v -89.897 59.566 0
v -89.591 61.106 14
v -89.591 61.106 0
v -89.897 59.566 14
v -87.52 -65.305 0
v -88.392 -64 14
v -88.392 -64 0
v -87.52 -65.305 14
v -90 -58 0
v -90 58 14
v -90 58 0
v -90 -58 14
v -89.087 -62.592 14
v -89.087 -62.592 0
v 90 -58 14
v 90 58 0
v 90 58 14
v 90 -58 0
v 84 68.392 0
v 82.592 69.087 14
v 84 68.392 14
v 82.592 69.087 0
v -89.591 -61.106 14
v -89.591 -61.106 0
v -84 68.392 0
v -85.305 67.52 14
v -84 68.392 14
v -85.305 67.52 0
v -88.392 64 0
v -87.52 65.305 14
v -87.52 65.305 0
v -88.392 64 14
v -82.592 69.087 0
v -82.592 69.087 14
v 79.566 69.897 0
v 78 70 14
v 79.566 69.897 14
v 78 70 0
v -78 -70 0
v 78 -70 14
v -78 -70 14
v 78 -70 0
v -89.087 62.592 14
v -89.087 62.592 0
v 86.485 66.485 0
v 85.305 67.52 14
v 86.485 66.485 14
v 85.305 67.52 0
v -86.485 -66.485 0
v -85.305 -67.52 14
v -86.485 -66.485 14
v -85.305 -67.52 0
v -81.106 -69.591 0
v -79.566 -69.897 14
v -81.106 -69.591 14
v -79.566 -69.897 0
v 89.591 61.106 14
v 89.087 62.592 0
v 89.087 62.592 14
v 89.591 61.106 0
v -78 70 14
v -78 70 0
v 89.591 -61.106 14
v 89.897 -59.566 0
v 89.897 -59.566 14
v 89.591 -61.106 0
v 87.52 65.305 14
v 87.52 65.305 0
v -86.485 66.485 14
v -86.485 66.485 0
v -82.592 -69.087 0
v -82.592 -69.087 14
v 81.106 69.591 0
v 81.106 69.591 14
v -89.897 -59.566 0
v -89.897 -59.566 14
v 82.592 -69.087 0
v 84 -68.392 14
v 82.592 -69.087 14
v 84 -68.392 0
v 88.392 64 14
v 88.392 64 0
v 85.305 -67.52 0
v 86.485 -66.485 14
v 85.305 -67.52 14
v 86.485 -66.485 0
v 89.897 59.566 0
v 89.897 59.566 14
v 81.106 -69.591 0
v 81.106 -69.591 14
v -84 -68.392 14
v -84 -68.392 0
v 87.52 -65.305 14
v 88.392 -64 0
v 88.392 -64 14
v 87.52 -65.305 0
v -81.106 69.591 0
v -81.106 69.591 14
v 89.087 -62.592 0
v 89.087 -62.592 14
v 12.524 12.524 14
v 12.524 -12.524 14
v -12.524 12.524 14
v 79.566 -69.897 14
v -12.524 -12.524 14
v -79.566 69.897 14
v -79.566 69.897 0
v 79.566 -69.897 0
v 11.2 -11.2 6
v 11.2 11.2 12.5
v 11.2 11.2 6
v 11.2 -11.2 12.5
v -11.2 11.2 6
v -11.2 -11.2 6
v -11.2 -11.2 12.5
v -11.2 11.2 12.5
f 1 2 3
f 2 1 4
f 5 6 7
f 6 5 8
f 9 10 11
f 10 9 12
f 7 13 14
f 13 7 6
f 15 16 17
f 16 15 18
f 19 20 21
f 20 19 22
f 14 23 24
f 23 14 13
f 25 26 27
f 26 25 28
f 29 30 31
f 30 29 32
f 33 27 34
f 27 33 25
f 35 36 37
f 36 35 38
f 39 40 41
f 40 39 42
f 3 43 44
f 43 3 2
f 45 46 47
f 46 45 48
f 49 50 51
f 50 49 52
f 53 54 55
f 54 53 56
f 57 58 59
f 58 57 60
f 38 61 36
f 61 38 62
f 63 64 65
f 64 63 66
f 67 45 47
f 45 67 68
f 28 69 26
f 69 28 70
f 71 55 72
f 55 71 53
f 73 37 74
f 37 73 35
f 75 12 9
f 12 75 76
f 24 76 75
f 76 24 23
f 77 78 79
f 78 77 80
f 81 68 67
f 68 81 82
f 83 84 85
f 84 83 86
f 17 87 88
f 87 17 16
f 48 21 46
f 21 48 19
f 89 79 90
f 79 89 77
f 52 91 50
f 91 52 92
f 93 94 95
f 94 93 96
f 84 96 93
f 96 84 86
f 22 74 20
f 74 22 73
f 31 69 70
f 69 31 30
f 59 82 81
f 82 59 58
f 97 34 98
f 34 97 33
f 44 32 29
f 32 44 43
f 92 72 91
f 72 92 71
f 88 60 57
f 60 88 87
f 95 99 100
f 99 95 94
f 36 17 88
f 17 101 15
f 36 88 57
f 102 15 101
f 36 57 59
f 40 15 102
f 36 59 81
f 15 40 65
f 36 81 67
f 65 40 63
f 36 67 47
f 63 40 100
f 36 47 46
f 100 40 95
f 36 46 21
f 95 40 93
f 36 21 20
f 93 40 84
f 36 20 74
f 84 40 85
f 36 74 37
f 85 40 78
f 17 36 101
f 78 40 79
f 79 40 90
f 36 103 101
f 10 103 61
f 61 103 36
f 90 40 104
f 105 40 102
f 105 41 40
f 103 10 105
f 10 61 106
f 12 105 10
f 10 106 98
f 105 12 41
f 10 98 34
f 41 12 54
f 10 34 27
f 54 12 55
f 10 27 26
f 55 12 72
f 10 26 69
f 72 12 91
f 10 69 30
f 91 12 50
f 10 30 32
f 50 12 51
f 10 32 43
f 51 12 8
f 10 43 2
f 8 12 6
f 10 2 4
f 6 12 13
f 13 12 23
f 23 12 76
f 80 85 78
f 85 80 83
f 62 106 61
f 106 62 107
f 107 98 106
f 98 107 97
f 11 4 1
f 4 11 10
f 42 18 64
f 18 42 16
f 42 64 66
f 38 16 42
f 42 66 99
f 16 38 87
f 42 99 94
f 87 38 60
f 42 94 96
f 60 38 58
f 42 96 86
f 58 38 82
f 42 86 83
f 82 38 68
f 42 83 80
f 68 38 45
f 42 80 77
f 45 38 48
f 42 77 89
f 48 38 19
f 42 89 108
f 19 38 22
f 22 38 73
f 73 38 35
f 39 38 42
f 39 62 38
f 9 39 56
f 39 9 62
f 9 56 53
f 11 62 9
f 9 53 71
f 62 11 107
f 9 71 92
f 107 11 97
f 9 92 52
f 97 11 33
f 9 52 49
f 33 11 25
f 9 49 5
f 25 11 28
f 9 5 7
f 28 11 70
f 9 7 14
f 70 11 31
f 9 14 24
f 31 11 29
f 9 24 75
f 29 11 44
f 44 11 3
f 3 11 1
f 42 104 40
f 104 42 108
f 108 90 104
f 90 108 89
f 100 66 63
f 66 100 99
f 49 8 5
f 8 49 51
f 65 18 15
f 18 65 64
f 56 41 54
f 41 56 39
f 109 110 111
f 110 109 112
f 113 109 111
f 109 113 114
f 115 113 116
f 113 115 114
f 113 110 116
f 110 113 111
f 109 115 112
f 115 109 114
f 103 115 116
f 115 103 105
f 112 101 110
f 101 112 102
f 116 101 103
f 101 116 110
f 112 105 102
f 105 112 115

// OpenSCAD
/* Headphone stand in three parts: base, post, hanger.
   Each part is exported in its print orientation (rests on min z, +Z up).
   Joints: square slip fit 22/22.4 (base-post) and 18/18.4 (post-hanger),
   0.2 mm/side nominal clearance. */

part = "base"; // [base,post,hanger,assembly]

cadverify_only = "";
module instance(name, part, unit = 1) {
    echo(cadverify_instance = [name, part, unit]);
    if (cadverify_only == "" || cadverify_only == name) children();
}

// ---------- parameters (mm) ----------
base_L = 180; base_W = 140; base_H = 14; base_corner_r = 12;
base_sock_S = 22.4; base_sock_straight_top = 12.5; base_sock_floor = 6;
base_flare_top_S = 25.4;

post_bot_tenon_S = 22; post_bot_tenon_H = 8;
post_cone_H = 4; post_body_bot_S = 30; post_body_top_S = 24; post_body_H = 224;
post_top_tenon_S = 18; post_top_tenon_H = 8;

hanger_L = 110; hanger_W = 44; hanger_slab_H = 6; hanger_ridge_R = 22;
hanger_ridge_L = 90; hanger_sock_S = 18.4; hanger_sock_H = 8.1;
hanger_roof_base = 7.9; hanger_roof_H = 9.2;

post_Z = 6;
hanger_Z = 242; // post shoulder (236+6) -> hanger top 242+28 = 270

// ---------- modules (print orientation, min z = 0) ----------
module base() {
    difference() {
        linear_extrude(height = base_H)
            hull() {
                for (sx = [-1, 1], sy = [-1, 1])
                    translate([sx*(base_L/2-base_corner_r), sy*(base_W/2-base_corner_r)])
                        circle(r = base_corner_r, $fn = 48);
            }
        // straight socket
        translate([-base_sock_S/2, -base_sock_S/2, base_sock_floor])
            cube([base_sock_S, base_sock_S, base_H - base_sock_floor + 0.2]);
        // 45 deg entry flare
        translate([0, 0, base_sock_straight_top])
            linear_extrude(height = base_H - base_sock_straight_top + 0.2,
                           scale = base_flare_top_S/base_sock_S)
                square([base_sock_S, base_sock_S], center = true);
    }
}

module post() {
    // bottom tenon
    translate([-post_bot_tenon_S/2, -post_bot_tenon_S/2, 0])
        cube([post_bot_tenon_S, post_bot_tenon_S, post_bot_tenon_H]);
    // 45 deg collar cone 22 -> 30
    translate([0, 0, post_bot_tenon_H])
        linear_extrude(height = post_cone_H, scale = post_body_bot_S/post_bot_tenon_S)
            square([post_bot_tenon_S, post_bot_tenon_S], center = true);
    // tapered body 30 -> 24
    translate([0, 0, post_bot_tenon_H + post_cone_H])
        linear_extrude(height = post_body_H, scale = post_body_top_S/post_body_bot_S)
            square([post_body_bot_S, post_body_bot_S], center = true);
    // top tenon
    translate([-post_top_tenon_S/2, -post_top_tenon_S/2,
               post_bot_tenon_H + post_cone_H + post_body_H])
        cube([post_top_tenon_S, post_top_tenon_S, post_top_tenon_H]);
}

module hanger() {
    difference() {
        union() {
            // bottom slab with rounded plan corners
            linear_extrude(height = hanger_slab_H)
                hull() {
                    for (sx = [-1, 1], sy = [-1, 1])
                        translate([sx*(hanger_L/2-6), sy*(hanger_W/2-6)])
                            circle(r = 6, $fn = 32);
                }
            // rounded crown: top half of a horizontal cylinder along X
            intersection() {
                translate([0, 0, hanger_slab_H])
                    rotate([0, 90, 0])
                        cylinder(r = hanger_ridge_R, h = hanger_ridge_L,
                                 center = true, $fn = 128);
                translate([-hanger_ridge_L/2, -hanger_W/2, hanger_slab_H - 0.1])
                    cube([hanger_ridge_L, hanger_W, hanger_ridge_R + 0.1]);
            }
        }
        // straight socket from the bed face, top meets roof base exactly
        translate([-hanger_sock_S/2, -hanger_sock_S/2, -0.1])
            cube([hanger_sock_S, hanger_sock_S, hanger_roof_base + 0.1]);
        // 45 deg pyramid roof inside (no flat ceiling -> no supports)
        translate([0, 0, hanger_roof_base])
            linear_extrude(height = hanger_roof_H, scale = 0)
                square([hanger_sock_S, hanger_sock_S], center = true);
    }
}

module assembly() {
    instance("base_1", "base") translate([0, 0, 0]) base();
    instance("post_1", "post") translate([0, 0, post_Z]) post();
    instance("hanger_1", "hanger") translate([0, 0, hanger_Z]) hanger();
}

// ---------- spec ----------
if (part == "base") {
    echo(cadverify_spec = [
        ["bounds", [[-90, -70, 0], [90, 70, 14]]],
        ["bodies", 1],
        ["through_holes", 0],
        ["support_faces", [["base_bottom", "-z", 20000]]],
        ["overhangs_allowed", []],
        ["copies", 1],
        ["details", [
            ["base_plate", "material", [[-90, -70, 0], [90, 70, 6]], 0.9],
            ["socket_void", "void", [[-11.2, -11.2, 6], [11.2, 11.2, 12.5]], 0.9],
            ["mouth_flare", "hole", [0, 0, 20], [0, 0, -1], [[0, 28.2], [1.5, 25.3]]],
            ["floor", "thickness", [0, 0, -5], [0, 0, 1], 6]
        ]]
    ]);
} else if (part == "post") {
    echo(cadverify_spec = [
        ["bounds", [[-15, -15, 0], [15, 15, 244]]],
        ["bodies", 1],
        ["through_holes", 0],
        ["support_faces", [["tenon_bottom", "-z", 400]]],
        ["overhangs_allowed", []],
        ["copies", 1],
        ["details", [
            ["bottom_tenon", "material", [[-11, -11, 0], [11, 11, 8]], 0.9],
            ["collar", "material", [[-10, -10, 8], [10, 10, 12]], 0.9],
            ["body_inner", "material", [[-11, -11, 30], [11, 11, 100]], 0.9],
            ["top_tenon", "material", [[-9, -9, 236], [9, 9, 244]], 0.9],
            ["side_wall", "thickness", [-30, 0, 100], [1, 0, 0], 27.6]
        ]]
    ]);
} else if (part == "hanger") {
    echo(cadverify_spec = [
        ["bounds", [[-55, -22, 0], [55, 22, 28]]],
        ["bodies", 1],
        ["through_holes", 0],
        ["support_faces", [["hanger_bottom", "-z", 3500]]],
        ["overhangs_allowed", []],
        ["copies", 1],
        ["details", [
            ["wing_solid", "material", [[25, -20, 0], [50, 20, 6]], 0.9],
            ["ridge_solid", "material", [[25, -6, 10], [40, 6, 20]], 0.9],
            ["socket_void", "void", [[-9.2, -9.2, 0], [9.2, 9.2, 8]], 0.9],
            ["roof_void", "void", [[-9.2, -9.2, 8], [9.2, 9.2, 17.1]], 0.3],
            ["socket_entry", "hole", [0, 0, -5], [0, 0, 1], [[0, 20.8], [8, 20.8]]],
            ["crown_width", "thickness", [0, -30, 20], [0, 1, 0], 33.9],
            ["crown_floor", "thickness", [0, 0, 35], [0, 0, -1], 10.9],
            ["crown_round", "view", [[-20, -22, 20], [20, 22, 28]]]
        ]]
    ]);
} else if (part == "assembly") {
    echo(cadverify_spec = [
        ["bounds", [[-90, -70, 0], [90, 70, 270]]],
        ["support_faces", [["desk", "-z", 20000]]],
        ["allowed_interferences", []],
        ["motions", []],
        ["assembly_order", [
            [["base_1"], [0, 0, 0]],
            [["post_1"], [0, 0, -1]],
            [["hanger_1"], [0, 0, -1]]
        ]]
    ]);
}

// ---------- output ----------
if (part == "base") base();
else if (part == "post") post();
else if (part == "hanger") hanger();
else if (part == "assembly") assembly();
